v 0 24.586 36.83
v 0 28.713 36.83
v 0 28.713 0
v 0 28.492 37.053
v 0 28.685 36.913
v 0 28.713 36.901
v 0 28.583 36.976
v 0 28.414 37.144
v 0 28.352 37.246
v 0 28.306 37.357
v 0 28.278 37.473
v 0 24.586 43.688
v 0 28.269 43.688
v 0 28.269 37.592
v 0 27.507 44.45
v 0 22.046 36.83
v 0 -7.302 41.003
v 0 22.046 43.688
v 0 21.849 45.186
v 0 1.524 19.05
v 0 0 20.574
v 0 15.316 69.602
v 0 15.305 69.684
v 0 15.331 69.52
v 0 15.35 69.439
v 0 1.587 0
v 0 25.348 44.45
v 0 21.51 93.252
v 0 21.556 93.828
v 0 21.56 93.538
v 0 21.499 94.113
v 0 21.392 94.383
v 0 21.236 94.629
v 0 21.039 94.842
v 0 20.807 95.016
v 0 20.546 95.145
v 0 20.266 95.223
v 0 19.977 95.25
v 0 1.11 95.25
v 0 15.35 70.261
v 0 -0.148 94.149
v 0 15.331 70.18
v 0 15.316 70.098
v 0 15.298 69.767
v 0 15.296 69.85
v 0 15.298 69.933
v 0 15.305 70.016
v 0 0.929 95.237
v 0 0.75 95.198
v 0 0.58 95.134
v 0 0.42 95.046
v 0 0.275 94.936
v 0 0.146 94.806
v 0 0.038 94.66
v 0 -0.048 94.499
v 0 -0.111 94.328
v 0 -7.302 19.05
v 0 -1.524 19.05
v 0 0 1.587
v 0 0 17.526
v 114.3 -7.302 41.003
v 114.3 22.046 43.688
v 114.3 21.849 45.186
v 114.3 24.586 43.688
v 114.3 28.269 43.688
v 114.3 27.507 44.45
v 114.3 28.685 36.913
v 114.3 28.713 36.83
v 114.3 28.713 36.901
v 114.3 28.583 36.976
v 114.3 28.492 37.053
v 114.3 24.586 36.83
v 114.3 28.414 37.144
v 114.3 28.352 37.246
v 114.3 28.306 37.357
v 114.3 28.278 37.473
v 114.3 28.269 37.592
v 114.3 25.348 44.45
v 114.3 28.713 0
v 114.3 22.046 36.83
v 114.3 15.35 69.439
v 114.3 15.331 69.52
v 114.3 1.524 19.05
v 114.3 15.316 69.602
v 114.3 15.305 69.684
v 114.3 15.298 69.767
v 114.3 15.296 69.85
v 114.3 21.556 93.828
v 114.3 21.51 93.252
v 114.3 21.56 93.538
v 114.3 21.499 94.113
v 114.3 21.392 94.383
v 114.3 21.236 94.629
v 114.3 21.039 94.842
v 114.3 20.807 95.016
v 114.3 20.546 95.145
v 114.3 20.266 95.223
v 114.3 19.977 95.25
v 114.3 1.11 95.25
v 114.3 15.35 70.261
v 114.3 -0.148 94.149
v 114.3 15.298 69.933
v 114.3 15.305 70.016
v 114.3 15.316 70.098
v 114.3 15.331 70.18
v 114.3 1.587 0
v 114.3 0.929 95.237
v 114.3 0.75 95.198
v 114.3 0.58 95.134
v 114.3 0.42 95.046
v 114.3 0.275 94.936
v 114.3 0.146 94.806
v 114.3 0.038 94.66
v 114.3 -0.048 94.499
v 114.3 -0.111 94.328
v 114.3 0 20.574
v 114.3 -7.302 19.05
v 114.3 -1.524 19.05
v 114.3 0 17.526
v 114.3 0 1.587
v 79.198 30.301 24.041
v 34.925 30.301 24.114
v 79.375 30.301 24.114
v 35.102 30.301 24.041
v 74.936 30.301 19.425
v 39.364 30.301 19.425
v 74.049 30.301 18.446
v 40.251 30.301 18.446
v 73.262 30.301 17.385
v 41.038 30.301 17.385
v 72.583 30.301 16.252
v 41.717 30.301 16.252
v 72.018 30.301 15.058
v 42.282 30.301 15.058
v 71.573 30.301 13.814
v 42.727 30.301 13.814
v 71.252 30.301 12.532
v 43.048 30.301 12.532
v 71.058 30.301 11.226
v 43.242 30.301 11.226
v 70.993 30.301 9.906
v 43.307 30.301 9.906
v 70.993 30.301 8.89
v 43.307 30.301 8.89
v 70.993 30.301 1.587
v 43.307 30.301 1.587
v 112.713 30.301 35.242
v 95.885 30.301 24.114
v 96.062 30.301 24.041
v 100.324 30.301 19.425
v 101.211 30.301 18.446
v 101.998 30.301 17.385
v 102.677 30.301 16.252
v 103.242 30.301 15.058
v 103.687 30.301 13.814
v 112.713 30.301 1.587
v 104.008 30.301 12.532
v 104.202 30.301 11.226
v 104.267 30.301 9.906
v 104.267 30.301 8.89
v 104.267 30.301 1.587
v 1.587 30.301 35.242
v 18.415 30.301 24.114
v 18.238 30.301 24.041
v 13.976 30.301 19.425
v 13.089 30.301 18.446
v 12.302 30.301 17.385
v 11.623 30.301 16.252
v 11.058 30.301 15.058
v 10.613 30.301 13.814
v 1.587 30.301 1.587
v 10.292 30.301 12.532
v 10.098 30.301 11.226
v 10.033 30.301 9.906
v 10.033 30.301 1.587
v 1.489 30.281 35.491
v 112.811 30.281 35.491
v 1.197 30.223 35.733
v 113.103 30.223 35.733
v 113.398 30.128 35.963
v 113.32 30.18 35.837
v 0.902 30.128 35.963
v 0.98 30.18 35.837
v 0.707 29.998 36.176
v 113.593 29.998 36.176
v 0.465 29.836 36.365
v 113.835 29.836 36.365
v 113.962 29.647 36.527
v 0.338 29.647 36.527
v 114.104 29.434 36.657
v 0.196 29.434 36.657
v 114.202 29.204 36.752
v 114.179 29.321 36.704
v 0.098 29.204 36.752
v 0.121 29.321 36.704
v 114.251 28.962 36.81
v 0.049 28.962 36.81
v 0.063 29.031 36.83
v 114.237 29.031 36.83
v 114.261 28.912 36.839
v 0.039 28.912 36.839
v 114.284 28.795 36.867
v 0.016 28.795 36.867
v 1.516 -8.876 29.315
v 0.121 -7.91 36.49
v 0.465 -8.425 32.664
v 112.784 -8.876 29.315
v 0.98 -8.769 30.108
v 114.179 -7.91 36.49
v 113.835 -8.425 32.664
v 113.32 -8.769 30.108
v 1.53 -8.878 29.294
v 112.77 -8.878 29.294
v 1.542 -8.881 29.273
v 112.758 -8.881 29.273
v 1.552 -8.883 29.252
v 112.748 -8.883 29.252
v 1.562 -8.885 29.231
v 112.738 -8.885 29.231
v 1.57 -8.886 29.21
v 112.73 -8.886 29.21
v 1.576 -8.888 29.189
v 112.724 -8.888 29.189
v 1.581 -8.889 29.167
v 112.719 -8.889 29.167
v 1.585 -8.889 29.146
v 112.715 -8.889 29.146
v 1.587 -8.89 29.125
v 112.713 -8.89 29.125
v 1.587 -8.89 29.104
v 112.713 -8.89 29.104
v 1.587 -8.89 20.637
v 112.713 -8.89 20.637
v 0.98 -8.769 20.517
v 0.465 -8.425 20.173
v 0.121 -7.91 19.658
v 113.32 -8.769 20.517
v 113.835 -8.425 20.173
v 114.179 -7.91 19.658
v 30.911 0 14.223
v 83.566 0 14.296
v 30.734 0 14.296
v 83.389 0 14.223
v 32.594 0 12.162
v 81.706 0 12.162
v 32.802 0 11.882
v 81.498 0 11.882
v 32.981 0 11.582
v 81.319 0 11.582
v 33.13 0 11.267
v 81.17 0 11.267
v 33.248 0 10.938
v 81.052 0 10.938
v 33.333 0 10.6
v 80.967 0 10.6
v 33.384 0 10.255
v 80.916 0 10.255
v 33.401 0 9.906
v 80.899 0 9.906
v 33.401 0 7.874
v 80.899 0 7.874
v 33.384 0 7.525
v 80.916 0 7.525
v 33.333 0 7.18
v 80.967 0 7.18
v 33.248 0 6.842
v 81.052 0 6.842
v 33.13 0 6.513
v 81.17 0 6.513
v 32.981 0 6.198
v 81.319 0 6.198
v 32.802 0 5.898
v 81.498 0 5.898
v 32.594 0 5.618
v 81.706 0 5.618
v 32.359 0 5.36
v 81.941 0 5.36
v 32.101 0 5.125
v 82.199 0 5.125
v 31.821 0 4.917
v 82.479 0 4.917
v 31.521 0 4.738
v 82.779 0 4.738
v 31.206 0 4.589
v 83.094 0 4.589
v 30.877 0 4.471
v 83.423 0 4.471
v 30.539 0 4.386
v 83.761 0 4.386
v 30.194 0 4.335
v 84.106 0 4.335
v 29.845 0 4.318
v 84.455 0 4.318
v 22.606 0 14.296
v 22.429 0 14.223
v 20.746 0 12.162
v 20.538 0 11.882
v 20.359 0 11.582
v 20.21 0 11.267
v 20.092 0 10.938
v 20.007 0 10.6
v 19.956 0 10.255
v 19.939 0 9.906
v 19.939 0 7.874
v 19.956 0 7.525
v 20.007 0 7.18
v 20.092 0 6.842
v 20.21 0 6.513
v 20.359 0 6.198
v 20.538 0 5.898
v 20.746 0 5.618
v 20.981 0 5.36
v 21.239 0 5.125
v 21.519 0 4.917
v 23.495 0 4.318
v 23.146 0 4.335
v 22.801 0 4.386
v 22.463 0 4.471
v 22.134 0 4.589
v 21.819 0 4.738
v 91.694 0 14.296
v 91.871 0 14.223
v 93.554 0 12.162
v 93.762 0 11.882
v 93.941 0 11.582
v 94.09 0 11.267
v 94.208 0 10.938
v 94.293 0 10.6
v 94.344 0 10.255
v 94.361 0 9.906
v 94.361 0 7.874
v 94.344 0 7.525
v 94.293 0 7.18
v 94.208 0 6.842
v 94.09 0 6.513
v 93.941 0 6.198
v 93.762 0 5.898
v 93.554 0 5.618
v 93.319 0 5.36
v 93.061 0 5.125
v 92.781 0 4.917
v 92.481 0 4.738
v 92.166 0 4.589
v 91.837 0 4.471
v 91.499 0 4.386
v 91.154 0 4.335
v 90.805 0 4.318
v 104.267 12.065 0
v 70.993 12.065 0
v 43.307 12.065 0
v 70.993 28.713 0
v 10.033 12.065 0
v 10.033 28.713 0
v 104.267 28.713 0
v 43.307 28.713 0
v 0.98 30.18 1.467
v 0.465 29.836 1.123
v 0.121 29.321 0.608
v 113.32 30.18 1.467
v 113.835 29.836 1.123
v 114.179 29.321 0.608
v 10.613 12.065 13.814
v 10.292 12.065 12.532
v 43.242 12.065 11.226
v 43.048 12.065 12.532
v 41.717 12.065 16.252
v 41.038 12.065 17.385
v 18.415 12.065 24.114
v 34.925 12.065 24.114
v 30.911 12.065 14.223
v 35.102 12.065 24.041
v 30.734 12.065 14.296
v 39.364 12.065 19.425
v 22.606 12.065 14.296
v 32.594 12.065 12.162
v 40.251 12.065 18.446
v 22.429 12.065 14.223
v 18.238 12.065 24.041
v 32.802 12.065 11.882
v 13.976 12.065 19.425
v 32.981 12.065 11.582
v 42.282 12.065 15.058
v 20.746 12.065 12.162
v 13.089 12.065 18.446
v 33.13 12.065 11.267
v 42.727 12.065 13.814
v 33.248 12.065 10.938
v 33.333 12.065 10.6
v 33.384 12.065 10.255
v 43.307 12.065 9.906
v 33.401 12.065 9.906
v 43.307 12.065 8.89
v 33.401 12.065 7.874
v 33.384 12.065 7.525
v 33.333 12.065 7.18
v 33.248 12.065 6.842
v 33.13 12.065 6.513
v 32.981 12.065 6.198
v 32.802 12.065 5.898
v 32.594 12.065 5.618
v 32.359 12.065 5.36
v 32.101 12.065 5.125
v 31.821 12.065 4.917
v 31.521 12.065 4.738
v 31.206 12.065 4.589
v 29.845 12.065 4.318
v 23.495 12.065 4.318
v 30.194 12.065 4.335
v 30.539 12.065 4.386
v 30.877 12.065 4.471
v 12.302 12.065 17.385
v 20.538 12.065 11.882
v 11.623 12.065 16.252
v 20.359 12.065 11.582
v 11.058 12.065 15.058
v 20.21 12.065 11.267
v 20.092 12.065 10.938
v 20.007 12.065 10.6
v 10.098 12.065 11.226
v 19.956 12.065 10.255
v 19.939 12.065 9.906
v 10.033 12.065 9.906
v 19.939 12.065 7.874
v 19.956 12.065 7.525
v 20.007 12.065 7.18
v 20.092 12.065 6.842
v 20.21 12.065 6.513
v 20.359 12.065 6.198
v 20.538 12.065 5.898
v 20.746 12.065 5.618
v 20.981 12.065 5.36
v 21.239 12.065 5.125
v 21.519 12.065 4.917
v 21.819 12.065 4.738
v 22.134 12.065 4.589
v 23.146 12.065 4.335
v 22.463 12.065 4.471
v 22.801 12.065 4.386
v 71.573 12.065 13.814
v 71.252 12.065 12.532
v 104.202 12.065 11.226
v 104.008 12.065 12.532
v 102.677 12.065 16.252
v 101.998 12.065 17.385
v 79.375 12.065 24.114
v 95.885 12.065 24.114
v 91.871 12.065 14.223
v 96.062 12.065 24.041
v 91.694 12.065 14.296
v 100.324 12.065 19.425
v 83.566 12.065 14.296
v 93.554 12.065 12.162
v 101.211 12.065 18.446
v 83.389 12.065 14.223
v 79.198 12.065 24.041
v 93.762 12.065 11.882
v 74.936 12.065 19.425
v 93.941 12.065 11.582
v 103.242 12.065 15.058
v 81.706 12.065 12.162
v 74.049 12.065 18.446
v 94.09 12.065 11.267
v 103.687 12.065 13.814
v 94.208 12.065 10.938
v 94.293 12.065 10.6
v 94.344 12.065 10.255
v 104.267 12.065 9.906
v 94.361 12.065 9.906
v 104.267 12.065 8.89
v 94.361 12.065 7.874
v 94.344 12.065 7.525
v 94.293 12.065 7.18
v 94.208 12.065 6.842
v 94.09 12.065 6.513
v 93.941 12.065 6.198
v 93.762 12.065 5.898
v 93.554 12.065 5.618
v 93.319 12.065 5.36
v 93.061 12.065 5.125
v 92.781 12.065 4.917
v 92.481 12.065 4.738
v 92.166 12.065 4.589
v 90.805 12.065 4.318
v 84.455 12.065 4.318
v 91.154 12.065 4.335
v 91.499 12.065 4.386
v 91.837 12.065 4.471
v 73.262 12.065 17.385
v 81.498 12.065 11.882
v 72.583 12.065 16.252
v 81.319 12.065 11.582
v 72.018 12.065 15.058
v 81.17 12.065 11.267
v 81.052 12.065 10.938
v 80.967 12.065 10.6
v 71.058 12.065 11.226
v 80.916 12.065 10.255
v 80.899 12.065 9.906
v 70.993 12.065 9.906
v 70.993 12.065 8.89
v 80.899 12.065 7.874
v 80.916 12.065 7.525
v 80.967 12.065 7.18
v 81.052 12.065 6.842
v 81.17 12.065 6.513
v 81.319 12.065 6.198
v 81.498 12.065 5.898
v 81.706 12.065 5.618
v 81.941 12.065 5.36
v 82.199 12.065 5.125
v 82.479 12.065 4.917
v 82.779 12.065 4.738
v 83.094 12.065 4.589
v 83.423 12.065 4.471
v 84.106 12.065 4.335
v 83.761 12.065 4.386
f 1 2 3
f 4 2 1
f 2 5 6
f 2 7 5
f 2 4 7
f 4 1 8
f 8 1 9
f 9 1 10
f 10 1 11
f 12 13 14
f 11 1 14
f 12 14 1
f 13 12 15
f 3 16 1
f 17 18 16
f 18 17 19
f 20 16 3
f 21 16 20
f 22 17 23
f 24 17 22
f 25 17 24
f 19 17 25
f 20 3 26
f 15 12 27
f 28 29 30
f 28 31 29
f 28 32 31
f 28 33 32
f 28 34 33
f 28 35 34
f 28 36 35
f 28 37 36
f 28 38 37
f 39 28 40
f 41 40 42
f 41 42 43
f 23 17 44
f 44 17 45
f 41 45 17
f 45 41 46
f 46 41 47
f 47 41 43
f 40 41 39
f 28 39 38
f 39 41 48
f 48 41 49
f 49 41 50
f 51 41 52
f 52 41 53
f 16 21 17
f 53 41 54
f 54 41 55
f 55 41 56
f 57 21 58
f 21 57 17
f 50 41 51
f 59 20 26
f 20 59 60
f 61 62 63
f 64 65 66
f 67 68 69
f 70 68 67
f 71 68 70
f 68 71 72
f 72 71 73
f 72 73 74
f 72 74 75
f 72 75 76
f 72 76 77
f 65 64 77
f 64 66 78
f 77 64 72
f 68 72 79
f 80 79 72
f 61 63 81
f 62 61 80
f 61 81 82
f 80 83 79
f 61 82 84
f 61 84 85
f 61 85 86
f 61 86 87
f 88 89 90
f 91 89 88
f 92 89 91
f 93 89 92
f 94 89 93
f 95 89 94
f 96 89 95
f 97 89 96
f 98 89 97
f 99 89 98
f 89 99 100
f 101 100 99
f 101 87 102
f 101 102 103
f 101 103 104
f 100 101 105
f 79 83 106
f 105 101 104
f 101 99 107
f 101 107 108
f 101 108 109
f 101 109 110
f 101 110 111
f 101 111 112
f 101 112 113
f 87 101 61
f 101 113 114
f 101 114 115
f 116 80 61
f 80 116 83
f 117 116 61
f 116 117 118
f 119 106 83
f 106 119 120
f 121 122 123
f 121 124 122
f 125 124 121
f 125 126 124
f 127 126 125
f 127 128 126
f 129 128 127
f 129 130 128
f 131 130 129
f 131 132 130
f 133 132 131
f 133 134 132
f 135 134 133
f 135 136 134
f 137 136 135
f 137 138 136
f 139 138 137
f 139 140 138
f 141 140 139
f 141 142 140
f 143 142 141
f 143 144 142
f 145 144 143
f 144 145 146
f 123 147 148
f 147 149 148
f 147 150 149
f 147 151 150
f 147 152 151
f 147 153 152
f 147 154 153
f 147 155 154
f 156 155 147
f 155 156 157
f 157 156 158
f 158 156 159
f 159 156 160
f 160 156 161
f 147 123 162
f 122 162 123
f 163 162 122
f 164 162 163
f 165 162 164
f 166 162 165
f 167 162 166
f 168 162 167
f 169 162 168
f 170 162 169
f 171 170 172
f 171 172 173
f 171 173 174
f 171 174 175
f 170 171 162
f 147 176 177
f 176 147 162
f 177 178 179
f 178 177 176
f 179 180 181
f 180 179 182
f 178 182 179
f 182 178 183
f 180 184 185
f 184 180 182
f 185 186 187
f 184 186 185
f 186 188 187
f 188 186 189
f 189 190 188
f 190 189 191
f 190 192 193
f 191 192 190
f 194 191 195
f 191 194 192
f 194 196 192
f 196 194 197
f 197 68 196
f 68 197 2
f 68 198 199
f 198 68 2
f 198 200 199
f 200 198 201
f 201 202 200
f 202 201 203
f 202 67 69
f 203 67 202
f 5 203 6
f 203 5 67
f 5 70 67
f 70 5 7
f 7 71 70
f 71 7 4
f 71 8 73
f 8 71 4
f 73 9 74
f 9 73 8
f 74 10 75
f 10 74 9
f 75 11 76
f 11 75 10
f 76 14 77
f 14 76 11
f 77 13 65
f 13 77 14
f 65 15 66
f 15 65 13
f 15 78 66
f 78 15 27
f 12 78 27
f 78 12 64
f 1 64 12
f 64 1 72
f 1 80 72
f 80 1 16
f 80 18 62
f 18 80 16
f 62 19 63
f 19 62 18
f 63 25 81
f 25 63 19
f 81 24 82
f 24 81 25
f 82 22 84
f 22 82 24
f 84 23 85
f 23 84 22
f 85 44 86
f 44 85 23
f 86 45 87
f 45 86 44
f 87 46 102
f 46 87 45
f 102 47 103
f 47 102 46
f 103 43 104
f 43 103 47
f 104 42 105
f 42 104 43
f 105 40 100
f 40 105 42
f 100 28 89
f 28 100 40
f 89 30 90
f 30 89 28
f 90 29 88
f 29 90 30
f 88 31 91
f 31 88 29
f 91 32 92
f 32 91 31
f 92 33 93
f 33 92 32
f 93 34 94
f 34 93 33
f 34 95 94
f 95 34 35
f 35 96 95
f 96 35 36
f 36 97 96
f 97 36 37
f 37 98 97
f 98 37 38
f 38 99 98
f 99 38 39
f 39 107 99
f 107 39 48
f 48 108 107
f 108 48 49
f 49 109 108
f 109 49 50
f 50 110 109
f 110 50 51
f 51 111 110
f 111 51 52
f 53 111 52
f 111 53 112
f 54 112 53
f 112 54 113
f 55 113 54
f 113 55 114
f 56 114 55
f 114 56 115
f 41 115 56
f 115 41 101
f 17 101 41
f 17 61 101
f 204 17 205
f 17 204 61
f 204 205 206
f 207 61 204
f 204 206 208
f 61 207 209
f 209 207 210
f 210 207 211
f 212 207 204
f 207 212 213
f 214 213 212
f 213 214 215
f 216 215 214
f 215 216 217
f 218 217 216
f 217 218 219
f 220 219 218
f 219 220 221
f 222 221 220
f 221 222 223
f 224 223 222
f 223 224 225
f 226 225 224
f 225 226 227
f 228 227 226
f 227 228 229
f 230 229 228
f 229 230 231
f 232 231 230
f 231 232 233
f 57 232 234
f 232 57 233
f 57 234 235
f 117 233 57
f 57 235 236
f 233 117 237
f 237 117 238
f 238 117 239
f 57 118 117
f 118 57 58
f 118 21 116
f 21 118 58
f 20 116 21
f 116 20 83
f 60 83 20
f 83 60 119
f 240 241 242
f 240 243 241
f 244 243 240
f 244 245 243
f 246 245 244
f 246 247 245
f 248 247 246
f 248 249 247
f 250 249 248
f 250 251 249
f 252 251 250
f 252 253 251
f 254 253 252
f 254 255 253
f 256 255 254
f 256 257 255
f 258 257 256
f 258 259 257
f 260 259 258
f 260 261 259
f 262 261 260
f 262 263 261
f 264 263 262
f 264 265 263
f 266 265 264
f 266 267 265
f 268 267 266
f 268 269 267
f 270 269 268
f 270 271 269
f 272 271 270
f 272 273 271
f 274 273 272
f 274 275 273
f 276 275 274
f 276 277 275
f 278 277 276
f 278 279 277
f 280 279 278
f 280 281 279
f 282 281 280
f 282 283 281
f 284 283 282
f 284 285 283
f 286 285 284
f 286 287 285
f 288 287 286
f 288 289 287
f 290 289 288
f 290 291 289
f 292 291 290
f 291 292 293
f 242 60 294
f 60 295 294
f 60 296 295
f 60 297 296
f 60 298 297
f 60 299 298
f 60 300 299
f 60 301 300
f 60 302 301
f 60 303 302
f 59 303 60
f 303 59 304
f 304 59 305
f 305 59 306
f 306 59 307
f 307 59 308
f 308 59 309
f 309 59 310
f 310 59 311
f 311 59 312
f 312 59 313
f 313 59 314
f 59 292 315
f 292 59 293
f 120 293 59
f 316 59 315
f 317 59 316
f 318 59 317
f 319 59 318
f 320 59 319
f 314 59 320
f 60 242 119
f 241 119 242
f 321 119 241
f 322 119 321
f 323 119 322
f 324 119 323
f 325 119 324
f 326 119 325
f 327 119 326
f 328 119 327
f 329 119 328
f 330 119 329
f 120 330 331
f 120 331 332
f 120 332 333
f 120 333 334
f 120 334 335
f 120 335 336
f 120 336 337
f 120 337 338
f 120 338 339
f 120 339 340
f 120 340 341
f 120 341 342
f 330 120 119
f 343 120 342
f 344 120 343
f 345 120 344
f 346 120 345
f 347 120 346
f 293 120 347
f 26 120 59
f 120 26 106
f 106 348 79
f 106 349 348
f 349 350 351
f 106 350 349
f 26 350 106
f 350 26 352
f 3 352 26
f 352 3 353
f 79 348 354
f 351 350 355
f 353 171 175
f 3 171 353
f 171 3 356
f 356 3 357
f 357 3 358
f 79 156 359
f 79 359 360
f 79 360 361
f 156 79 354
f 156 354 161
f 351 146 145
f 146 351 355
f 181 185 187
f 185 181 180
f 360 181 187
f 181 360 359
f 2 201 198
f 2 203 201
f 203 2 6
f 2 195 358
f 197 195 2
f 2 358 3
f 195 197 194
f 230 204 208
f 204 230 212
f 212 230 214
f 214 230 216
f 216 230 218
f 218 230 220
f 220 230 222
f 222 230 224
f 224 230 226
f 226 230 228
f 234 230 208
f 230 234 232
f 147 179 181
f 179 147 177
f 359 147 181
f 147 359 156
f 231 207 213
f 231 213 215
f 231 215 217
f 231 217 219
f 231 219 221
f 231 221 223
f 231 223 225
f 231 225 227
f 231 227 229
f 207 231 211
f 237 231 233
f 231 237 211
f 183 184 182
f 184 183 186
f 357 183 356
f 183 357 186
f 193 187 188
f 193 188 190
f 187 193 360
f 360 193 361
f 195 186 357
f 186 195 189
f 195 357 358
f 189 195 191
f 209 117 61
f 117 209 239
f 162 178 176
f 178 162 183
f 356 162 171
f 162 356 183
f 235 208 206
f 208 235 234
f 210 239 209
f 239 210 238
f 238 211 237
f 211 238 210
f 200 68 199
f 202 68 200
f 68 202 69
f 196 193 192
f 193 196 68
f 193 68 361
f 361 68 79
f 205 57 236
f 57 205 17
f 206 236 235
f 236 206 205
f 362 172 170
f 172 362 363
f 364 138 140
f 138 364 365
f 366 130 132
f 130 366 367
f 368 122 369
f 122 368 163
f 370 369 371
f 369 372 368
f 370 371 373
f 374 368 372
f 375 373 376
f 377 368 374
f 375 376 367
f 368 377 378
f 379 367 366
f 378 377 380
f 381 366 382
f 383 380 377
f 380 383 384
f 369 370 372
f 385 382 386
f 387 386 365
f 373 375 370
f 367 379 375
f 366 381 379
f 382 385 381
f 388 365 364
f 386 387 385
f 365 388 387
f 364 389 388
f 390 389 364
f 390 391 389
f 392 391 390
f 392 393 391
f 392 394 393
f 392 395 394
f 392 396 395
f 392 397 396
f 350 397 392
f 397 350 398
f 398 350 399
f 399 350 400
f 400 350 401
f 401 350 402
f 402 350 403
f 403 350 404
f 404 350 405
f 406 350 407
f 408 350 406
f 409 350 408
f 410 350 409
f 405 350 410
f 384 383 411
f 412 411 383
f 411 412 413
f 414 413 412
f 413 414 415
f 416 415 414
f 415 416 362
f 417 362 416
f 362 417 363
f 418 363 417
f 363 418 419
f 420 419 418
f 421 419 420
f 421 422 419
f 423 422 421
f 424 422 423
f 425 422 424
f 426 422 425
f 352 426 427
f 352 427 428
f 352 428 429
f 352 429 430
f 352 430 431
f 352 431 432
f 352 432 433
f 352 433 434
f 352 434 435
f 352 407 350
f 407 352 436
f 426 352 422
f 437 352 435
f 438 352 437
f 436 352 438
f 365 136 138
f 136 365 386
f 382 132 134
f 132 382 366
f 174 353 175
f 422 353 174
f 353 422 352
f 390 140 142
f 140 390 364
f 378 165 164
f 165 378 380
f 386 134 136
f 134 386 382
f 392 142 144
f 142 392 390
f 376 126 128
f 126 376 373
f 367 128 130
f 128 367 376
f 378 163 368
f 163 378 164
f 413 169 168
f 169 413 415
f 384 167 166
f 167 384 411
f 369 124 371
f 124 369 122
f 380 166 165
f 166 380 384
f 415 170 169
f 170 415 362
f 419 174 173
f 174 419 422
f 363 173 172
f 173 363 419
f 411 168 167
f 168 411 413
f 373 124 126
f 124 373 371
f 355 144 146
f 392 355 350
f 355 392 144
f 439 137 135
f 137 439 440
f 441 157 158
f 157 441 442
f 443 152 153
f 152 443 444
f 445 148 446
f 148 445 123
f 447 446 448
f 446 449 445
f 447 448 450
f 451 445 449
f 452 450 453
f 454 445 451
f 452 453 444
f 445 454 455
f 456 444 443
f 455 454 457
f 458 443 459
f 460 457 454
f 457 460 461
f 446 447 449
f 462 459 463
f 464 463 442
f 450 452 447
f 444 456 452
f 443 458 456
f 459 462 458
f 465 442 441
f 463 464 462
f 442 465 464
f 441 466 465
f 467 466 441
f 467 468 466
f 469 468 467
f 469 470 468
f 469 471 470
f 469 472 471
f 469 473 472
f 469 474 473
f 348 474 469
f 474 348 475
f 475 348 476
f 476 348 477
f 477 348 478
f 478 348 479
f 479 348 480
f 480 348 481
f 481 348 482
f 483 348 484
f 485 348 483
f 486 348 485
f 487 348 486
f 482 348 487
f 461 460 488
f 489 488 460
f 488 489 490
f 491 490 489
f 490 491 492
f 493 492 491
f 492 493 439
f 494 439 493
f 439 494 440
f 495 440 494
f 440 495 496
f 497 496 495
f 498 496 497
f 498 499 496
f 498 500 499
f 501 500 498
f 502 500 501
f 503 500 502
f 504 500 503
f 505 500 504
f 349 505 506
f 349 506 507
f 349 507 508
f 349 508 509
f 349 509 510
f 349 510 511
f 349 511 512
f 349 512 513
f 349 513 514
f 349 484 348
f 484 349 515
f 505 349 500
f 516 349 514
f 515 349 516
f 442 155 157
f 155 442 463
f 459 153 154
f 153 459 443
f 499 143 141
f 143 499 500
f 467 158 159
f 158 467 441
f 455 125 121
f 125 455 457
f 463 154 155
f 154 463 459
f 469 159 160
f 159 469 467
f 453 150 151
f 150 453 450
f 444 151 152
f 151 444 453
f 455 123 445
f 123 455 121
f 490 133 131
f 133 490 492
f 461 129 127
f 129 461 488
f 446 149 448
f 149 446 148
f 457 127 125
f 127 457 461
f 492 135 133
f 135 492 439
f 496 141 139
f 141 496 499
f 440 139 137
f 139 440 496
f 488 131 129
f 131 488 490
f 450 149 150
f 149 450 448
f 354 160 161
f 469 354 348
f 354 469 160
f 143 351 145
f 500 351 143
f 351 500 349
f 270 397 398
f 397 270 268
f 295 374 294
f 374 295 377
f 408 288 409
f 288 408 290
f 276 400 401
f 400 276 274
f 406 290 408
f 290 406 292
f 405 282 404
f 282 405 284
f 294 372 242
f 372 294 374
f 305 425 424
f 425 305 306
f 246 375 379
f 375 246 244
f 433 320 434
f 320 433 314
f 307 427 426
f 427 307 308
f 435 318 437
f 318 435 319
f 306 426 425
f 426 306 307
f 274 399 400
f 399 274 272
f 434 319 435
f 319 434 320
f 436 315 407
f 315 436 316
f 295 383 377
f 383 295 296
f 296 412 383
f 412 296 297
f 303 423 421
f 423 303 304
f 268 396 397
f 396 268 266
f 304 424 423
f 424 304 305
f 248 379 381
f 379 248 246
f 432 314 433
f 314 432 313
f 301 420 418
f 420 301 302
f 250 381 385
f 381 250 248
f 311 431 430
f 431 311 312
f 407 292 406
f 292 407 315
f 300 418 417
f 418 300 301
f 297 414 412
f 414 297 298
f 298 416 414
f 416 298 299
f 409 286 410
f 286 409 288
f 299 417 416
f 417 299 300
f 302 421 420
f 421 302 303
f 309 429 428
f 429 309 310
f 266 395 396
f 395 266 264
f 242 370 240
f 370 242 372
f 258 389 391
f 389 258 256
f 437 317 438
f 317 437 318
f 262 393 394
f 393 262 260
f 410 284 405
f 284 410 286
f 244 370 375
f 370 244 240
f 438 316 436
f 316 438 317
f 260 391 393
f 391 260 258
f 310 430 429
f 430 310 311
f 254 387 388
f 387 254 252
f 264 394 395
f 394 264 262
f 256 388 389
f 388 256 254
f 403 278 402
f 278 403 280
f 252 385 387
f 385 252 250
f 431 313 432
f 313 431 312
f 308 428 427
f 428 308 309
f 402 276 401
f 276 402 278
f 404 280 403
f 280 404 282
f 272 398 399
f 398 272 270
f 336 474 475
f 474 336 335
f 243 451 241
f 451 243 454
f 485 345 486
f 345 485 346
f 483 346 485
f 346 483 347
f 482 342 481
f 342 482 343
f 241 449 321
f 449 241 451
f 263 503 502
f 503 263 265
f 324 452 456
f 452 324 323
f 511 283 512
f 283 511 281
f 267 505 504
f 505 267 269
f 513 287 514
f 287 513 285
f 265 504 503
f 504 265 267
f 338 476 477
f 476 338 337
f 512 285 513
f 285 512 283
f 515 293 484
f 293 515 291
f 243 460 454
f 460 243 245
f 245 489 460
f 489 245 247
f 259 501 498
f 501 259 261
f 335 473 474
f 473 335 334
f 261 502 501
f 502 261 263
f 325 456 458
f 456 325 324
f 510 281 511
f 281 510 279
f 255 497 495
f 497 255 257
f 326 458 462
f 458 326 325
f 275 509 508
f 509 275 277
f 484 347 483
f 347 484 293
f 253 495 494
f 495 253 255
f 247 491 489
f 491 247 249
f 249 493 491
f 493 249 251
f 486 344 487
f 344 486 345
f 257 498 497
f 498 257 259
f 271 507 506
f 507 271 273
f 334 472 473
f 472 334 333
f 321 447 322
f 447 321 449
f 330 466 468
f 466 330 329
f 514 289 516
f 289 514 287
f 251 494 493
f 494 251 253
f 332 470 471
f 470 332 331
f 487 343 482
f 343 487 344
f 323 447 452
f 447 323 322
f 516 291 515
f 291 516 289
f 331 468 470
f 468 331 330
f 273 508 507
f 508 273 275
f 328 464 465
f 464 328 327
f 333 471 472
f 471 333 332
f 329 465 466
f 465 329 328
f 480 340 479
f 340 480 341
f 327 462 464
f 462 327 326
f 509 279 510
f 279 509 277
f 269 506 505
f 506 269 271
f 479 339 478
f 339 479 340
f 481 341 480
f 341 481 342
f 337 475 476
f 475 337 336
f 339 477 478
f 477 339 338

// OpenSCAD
// Doyle Light-Vee Jaw  —  Rev R  (Rev Q printed in PA612-CF, 2026-09-09: (1) the Rev Q pocket roof pointed toward the vee (+Z), which
// is only "up" for the UPRIGHT print; on end, print-up is +X, so the pocket crowns and the open-bottom ceilings were flat 90deg overhangs
// and the corners drooped. Rev R points the roof along whichever axis is up for the chosen orientation (pocket_roof = "auto"), with a
// 0.40" flat at the peak (a 10 mm bridge) instead of a knife point. (2) The 3/4" screws bottomed in the casting's blind holes with a 0.35"
// wall — two M6 flats (0.125") under the fender fixed it — so wall_under_head is 0.475". Material verdict: "totally f***s, super strong".)
// Printed vee jaw for the Harbor Freight Doyle 4-1/2" swivel vise (HF #57737)
// Print two. Model is in mm; every parameter below is entered in inches.
// Modeled upright (Z = height, +Y = toward the workpiece, -Y = over the vise).
// PRINT STANDING ON END: set print_orientation = true (rotates so the length is Z).
// Every feature is part of the extruded profile, so on end it all prints as vertical walls.

in = 25.4;

/* [Jaw body] */
jaw_length_in       = 4.50;   // overall length (8.00 for the long version)
seat_height_in      = 0.75;   // casting top above jaw bottom (= steel plate height)  ** confirm **
apex_above_top_in   = 2.00;   // how far the vee apex sits above the vise top (the "raise")
vee_half_height_in  = 1.00;   // vee spans apex +/- this
back_to_apex_in     = 0.60;   // mounting face to vee apex (was 0.75)
face_angle_deg      = 15;     // vee face tilt off vertical (15 = 150 deg included)
apex_radius_in      = 0.0625; // fillet at the apex
end_chamfer_in      = 0.0625; // chamfer on the vertical end edges

/* [Saddle flange + solid back wedge] */
flange_depth_in     = 0.35;   // how far the saddle reaches back over the casting top (= back_taper). The casting flat is only ~1/4" before it rounds off.
flange_thick_in     = 0.40;   // lip thickness
corner_relief_in    = 0.06;   // 45deg relief at the inside corner so a radiused casting edge still seats
back_taper_in       = 0.35;   // solid wedge on the back, this thick at the saddle, tapering to 0 at the top (logo face ~82 deg)

/* [Parallel band + foam slot — a flat clamping face below the vee, proud of the vee edges like the steel
   plates were. A slot in the band top (against the vee) takes a craft-foam strip's bottom edge or the keel's
   set-tab. The lip in front of the slot is SET BACK from the band's clamp plane so a workpiece never bears on it.] */
foam_lip            = true;   // band + slot + lip on
band_proud_in       = 0.325;  // band (clamp) face proud of the vee-edge plane
foam_slot_in        = 0.10;   // slot width (2 mm craft foam; keel set-tab is 0.07)
foam_lip_height_in  = 0.30;   // slot depth = lip height; lip top is flush with the vee's lower edge
lip_setback_in      = 0.08;   // lip face behind the band clamp plane -> lip thickness = 0.325 - 0.10 - 0.08 = 0.145

/* [Edge easing — all on edges that run the length of the jaw (they are corners of the 2D profile, so they print
   as vertical walls on end). Bottom-of-feature edges get 45deg CHAMFERS (safe overhangs on the upright branded
   print); top edges get FILLETS. End-face edges keep the plain 1/16" end_chamfer.] */
ease_edges          = true;
ease_big_in         = 0.0625; // jaw bottom, flange underside, band top/bottom, top-front (vee) edge
ease_top_back_in    = 0.05;   // wedge/top-face edge (keeps the top face flat under the text)
ease_small_in       = 0.03;   // lip top edges, slot mouth, lip/band inside corner
ease_fn             = 10;     // segments per fillet

/* [Vise / screw pattern] */
vise_width_in       = 4.50;   // width of the plate seat (Doyle 4-1/2")
screw_cc_in         = 2.40;   // screw center-to-center (measured: holes 1.05" from each end of the 4.47" seat); 1/4-20 x 1-1/4 button heads
screw_height_in     = 0.35;   // screw axis above jaw bottom (= above plate bottom)
thru_dia_in         = 0.28;   // 9/32 clearance for 1/4-20 (the vise's jaw screws: 5/32 hex button heads, 20 tpi)
cbore_dia_in        = 1.06;   // clears a 1" OD fender washer; pocket is open through the jaw bottom, washer hangs 0.15" below it over air past the ~3/8" ledge
slot_travel_in      = 0.25;   // horizontal slot travel (1/8" each way)
slot_vert_in        = 0.08;   // vertical slop: the machined ledge sets the height, the saddle lands where the rough casting top puts it, the screws never fight either
wall_under_head_in  = 0.475;  // solid plastic between washer and casting (in compression). 0.35 let a 3/4" screw bottom in the blind hole;
                              // 0.475 (= 0.35 + two M6 flats, as fitted) leaves ~0.21" of thread, which is what the hole actually has
cbore_open_bottom   = true;   // washer pocket opens through the jaw bottom (no knife-edge sliver under a 16 mm washer; the plate seat closes it)
pocket_roof         = "auto"; // 45deg roof direction on the washer pockets: "z" (toward the vee: upright print), "x" (along the length:
                              // on-end print, +X is up), "none". "auto" follows print_orientation.
roof_flat_in        = 0.40;   // flat at the roof peak (bridged) instead of a knife point; shortens the roof by half this

/* [Branding — reads correctly on the MOVABLE jaw (wedge faces the operator)] */
brand_logo          = false;  // DCV Applied Technology logo debossed into the back wedge
logo_svg            = "dcv_logo_scad.svg";
logo_width_in       = 3.80;   // logo width across the wedge (wedge is jaw_length long)
brand_text          = false;  // "FUCK YEAH" debossed into the top face
brand_text_str      = "FUCK YEAH";
brand_font          = "Bangers";   // Bangers or Luckiest Guy (Google Fonts, OFL/Apache) — baked into the STL
brand_text_size_in  = 0.60;   // cap height on the 1.02"-wide top face
deboss_depth_in     = 0.04;   // 1 mm
flip_for_fixed_jaw  = false;  // mirror the text/logo so it reads right on the fixed jaw instead

/* [Witness marks — V-grooves at the 4.50" plate width (and center) for lining the jaw up on the vise] */
witness_marks       = false;
witness_width_in    = 4.50;   // = vise plate seat width
witness_v_in        = 0.08;   // groove width (90deg V, so depth is half this)
witness_slope_len_in= 0.50;   // length of the tick up the back wedge from the flange edge

/* [Options] */
side_cheeks         = false;  // fill the wings in under the flange to hug the casting sides (needs casting width)
casting_width_in    = 4.50;
cheek_clearance_in  = 0.03;
magnet_pockets      = false;
magnet_dia_in       = 0.25;
magnet_depth_in     = 0.13;
magnet_x_in         = [1.50, 4.00, 6.50];
magnet_offset_in    = 0.50;
show_test_plate     = false;  // 0.2" hole-pattern coupon instead of the jaw
print_orientation   = false;  // true = stand on end for printing

$fn = 64;

// ---------- derived ----------
L    = jaw_length_in * in;
SEAT = seat_height_in * in;
ZA   = SEAT + apex_above_top_in * in;          // apex height
VH   = vee_half_height_in * in;
H    = ZA + VH;                                 // overall height
ZL   = ZA - VH;                                 // lower edge of the vee
TA   = back_to_apex_in * in;
DEP  = VH * tan(face_angle_deg);
TE   = TA + DEP;                                // thickness at vee edges
FD   = flange_depth_in * in;
FT   = flange_thick_in * in;
BT   = back_taper_in * in;
CC   = screw_cc_in * in;
SH   = screw_height_in * in;
SLOT = slot_travel_in * in;
SLV  = slot_vert_in * in;
R    = apex_radius_in * in;
CH   = end_chamfer_in * in;
FG   = foam_slot_in * in;
BP   = band_proud_in * in;
FLH  = foam_lip_height_in * in;
LS   = lip_setback_in * in;
YMAX = TE + (foam_lip ? BP : 0);                // outermost +Y extent
DB   = deboss_depth_in * in;

echo(str("Length = ", L/in, " in   height = ", H/in, " in   apex at ", ZA/in, " in   opening at apex = ",
         (vise_width_in*in - 2*TA)/in, " in   overhang each side = ", (L - vise_width_in*in)/2/in, " in"));

// (Y,Z) profile.  Rev J builds the whole outline (vee included) as one corner list so every corner can be
// sharp (0), chamfered (1) or filleted (2) individually.  Fallback: the Rev H/I union-of-boxes profile.
function unit(v) = v / norm(v);
function arc(ctr, r, a1, d, n) = [for (k = [0 : n]) ctr + r * [cos(a1 + d * k / n), sin(a1 + d * k / n)]];
function corner(P, C, N, t, s, n) =
    t == 0 || s <= 0 ? [C] :
    let(u1 = unit(P - C), u2 = unit(N - C))
    t == 1 ? [C + u1 * s, C + u2 * s] :
    let(ang = acos(max(-1, min(1, u1 * u2))), th = ang / 2, tl = s / tan(th),
        ctr = C + unit(u1 + u2) * s / sin(th),
        p1 = C + u1 * tl, p2 = C + u2 * tl,
        a1 = atan2(p1[1] - ctr[1], p1[0] - ctr[0]), a2 = atan2(p2[1] - ctr[1], p2[0] - ctr[0]),
        d = ((a2 - a1 + 540) % 360) - 180)
    arc(ctr, s, a1, d, n);
function eased(pts, n) = [for (i = [0 : len(pts) - 1])
    for (p = corner(pts[(i - 1 + len(pts)) % len(pts)][0], pts[i][0], pts[(i + 1) % len(pts)][0], pts[i][1], pts[i][2], n)) p];

module profile_2d() {
    if (ease_edges && foam_lip) {
        CR = corner_relief_in * in;
        EB = ease_big_in * in; ET = ease_top_back_in * in; ES = ease_small_in * in;
        // [ [y, z], type (0 sharp / 1 chamfer / 2 fillet), size ]  — clockwise in (Y,Z)
        pts = [
            [[0, 0],                    1, EB],   // jaw bottom / mounting face
            [[0, SEAT - CR],            0, 0],    // inside-corner relief (45deg notch for the casting edge radius)
            [[CR, SEAT],                0, 0],
            [[0, SEAT + CR],            0, 0],
            [[-CR, SEAT],               0, 0],
            [[-FD, SEAT],               1, EB],   // flange underside / back face
            [[-FD, SEAT + FT],          2, EB],   // back face / wedge slope
            [[0, H],                    2, ET],   // wedge / top face
            [[TE, H],                   2, EB],   // top face / upper vee face
            [[TA, ZA],                  2, R],    // apex
            [[TE, ZL],                  1, ES],   // lower vee face / slot back wall
            [[TE, ZL - FLH],            0, 0],    // slot floor
            [[TE + FG, ZL - FLH],       0, 0],
            [[TE + FG, ZL],             1, ES],   // lip inside top
            [[TE + BP - LS, ZL],        1, ES],   // lip outside top
            [[TE + BP - LS, ZL - FLH],  2, ES],   // lip face / band top (inside corner)
            [[TE + BP, ZL - FLH],       2, EB],   // band top / clamp face
            [[TE + BP, 0],              1, EB],   // clamp face / jaw bottom
        ];
        polygon(eased(pts, ease_fn));
    } else {
        difference() {
            union() {
                square([TE, H]);                                     // face block
                translate([-FD, SEAT]) square([FD + 1, FT]);         // saddle lip over the vise top
                if (BT > 0)                                          // solid back wedge
                    polygon([[-BT, SEAT + FT - 0.01], [0.01, SEAT + FT - 0.01], [0.01, H]]);
                if (foam_lip) {                                      // parallel band, jaw bottom up to the slot floor
                    translate([TE - 0.01, 0]) square([BP + 0.01, ZL - FLH]);
                    translate([TE + FG, ZL - FLH - 0.01]) square([BP - FG - LS, FLH + 0.01]);
                }
            }
            translate([0, SEAT]) rotate(45) square(corner_relief_in * in * sqrt(2), center = true);
        }
    }
}

// vee wedge (in Y,Z), apex rounded
module vee_wedge_2d() {
    // bounded to the vee's own height so it can't shave the foam lip below it
    offset(r = R) offset(delta = -R)
        polygon([
            [TA, ZA],
            [TE, ZL],
            [TE + 20, ZL],
            [TE + 20, ZA + VH],
            [TE, ZA + VH]
        ]);
}

// rounded-rectangle slot, axis along Y, from y0 to y1
ROOF = pocket_roof == "auto" ? (print_orientation ? "x" : "z") : pocket_roof;
RFL  = roof_flat_in * in;

module slot(d, x, z, y0, y1, vert = 0, open_bottom = false, roof = "none", flat = RFL) {
    // slot along X (travel SLOT), cylinders along Y (depth), vertical slop VERT along Z. Local frame after rotate([-90,0,0]):
    // local x = jaw X, local -y = jaw Z, local z = jaw Y.
    r  = d / 2;
    h  = r * sqrt(2) - flat / 2;       // roof flat height above the bore centre: 45deg tangents from the flat's ends to the bore
    translate([x, y0, z]) rotate([-90, 0, 0])
        hull() {
            for (sx = [-1, 1], sz = [-1, 1])
                translate([sx * SLOT/2, sz * vert/2, 0]) cylinder(d = d, h = y1 - y0);
            if (roof == "z")   // roof toward +Z (jaw height): flat of RFL along X, h above the upper bore centres
                for (sx = [-1, 1]) translate([sx * (SLOT/2 + flat/2), -(vert/2 + h), 0]) cylinder(d = 0.5, h = y1 - y0, $fn = 8);
            if (roof == "x")   // roof toward +X (jaw length = print-up on end): flat of RFL along Z, h beyond the +X bore centres
                for (sz = [-1, 1]) translate([SLOT/2 + h, sz * (vert/2 + flat/2), 0]) cylinder(d = 0.5, h = y1 - y0, $fn = 8);
        }
    if (open_bottom) {   // straight walls from the bore centreline down through the jaw bottom.
        // With the roof along +X the +X wall of this notch would be a flat ceiling on the on-end print, so the notch stops
        // inside the roof line there (the 45deg roof itself runs out through the jaw bottom).
        xp = roof == "x" ? SLOT/2 + h - z + flat/2 - 0.5 : SLOT/2 + d/2;
        translate([x - SLOT/2 - d/2, y0, -1]) cube([SLOT/2 + d/2 + xp, y1 - y0, z + 1]);
    }
}

module magnet_pocket(x, upper) {
    zf = ZA + (upper ? 1 : -1) * magnet_offset_in * in;
    yf = TA + magnet_offset_in * in * tan(face_angle_deg);
    ang = upper ? -90 - face_angle_deg : -90 + face_angle_deg;
    translate([x, yf, zf]) rotate([ang, 0, 0])
        translate([0, 0, -magnet_depth_in * in]) cylinder(d = magnet_dia_in * in, h = magnet_depth_in * in + 3);
}

module flip2d() { if (flip_for_fixed_jaw) mirror([1, 0]) children(); else children(); }

// Deboss cutter for printing ON END (+X is up on the printer): the +X-facing wall of every stroke is
// the cavity's ceiling, so it is chamfered 45deg — each step deeper trims one step off the +X edge.
// Local 2D x must be model X. Children: the 2D artwork; cut goes from z=0 (surface) down to z=-DB.
module chamfered_deboss(steps = 4) {
    st = DB / steps;
    for (i = [0 : steps - 1])
        translate([0, 0, -(i + 1) * st]) linear_extrude(st + 0.02)
            intersection() { children(); translate([-(i + 1) * st, 0]) children(); }
    translate([0, 0, -0.01]) linear_extrude(2) children();      // clean break-out above the surface
}

// logo debossed into the sloped back wedge, centered on it
module logo_cut() {
    run  = BT; rise = H - (SEAT + FT);
    ang  = atan2(rise, run);                          // slope angle from horizontal (~60 deg)
    yc   = -BT/2; zc = (SEAT + FT + H)/2;
    translate([L/2, yc, zc]) rotate([ang, 0, 0])
        chamfered_deboss()
            flip2d() resize([logo_width_in * in, 0], auto = true) import(logo_svg, center = true);
}

// text debossed into the top face, centered
module text_cut() {
    translate([L/2, TE/2, H])
        chamfered_deboss()
            flip2d() text(brand_text_str, size = brand_text_size_in * in, font = brand_font,
                          halign = "center", valign = "center", spacing = 1.05);
}

// 90deg V-groove: runs along local Y from 0 to len, centered at local x, V cut into -Z from the z=0 surface
module vgroove(x, len) {
    w = witness_v_in * in;
    translate([x, 0, 0]) rotate([90, 0, 0]) mirror([0, 0, 1])
        linear_extrude(len) polygon([[-w/2, 0.01], [w/2, 0.01], [0, -w/2]]);
}

module witness_cuts() {
    ang = atan2(H - (SEAT + FT), BT);
    for (x = [L/2 - witness_width_in * in / 2, L/2, L/2 + witness_width_in * in / 2]) {
        translate([0, -BT - 1, H]) vgroove(x, TE + BT + 2);                       // across the top face
        translate([0, -BT, SEAT + FT]) rotate([ang, 0, 0]) vgroove(x, witness_slope_len_in * in);   // tick up the wedge
    }
}

module jaw() {
    difference() {
        union() {
            intersection() {
                rotate([90, 0, 90]) linear_extrude(L) profile_2d();
                hull() for (x = [CH, L - CH], y = [-FD + CH, YMAX - CH])
                    translate([x, y, 0]) cylinder(r = CH, h = H, $fn = 16);
            }
            if (side_cheeks) {
                cw = casting_width_in * in / 2 + cheek_clearance_in * in;
                for (x0 = [0, L/2 + cw])
                    translate([x0, -FD, 0]) cube([L/2 - cw, FD, SEAT]);
            }
        }
        if (!(ease_edges && foam_lip)) rotate([90, 0, 90]) translate([0, 0, -1]) linear_extrude(L + 2) vee_wedge_2d();
        for (x = [L/2 - CC/2, L/2 + CC/2]) {
            slot(thru_dia_in * in, x, SH, -FD - 1, YMAX + 5, SLV, roof = ROOF, flat = thru_dia_in * in / 4);   // small roof on the 9/32 too
            slot(cbore_dia_in * in, x, SH, wall_under_head_in * in, YMAX + 5, SLV, cbore_open_bottom, roof = ROOF);
        }
        if (magnet_pockets)
            for (mx = magnet_x_in) for (u = [true, false]) if (mx * in < L) magnet_pocket(mx * in, u);
        if (brand_logo) logo_cut();
        if (brand_text) text_cut();
        if (witness_marks) witness_cuts();
    }
}

module test_plate() {
    t = 0.2 * in;
    difference() {
        translate([L/2 - CC/2 - 0.5*in, 0, 0]) cube([CC + 1*in, t, 1.0*in]);
        for (x = [L/2 - CC/2, L/2 + CC/2]) slot(thru_dia_in * in, x, SH, -1, t + 1, SLV);
    }
}

if (show_test_plate) test_plate();
else if (print_orientation) rotate([0, -90, 0]) jaw();   // stands on the X=0 end, length along Z
else jaw();
